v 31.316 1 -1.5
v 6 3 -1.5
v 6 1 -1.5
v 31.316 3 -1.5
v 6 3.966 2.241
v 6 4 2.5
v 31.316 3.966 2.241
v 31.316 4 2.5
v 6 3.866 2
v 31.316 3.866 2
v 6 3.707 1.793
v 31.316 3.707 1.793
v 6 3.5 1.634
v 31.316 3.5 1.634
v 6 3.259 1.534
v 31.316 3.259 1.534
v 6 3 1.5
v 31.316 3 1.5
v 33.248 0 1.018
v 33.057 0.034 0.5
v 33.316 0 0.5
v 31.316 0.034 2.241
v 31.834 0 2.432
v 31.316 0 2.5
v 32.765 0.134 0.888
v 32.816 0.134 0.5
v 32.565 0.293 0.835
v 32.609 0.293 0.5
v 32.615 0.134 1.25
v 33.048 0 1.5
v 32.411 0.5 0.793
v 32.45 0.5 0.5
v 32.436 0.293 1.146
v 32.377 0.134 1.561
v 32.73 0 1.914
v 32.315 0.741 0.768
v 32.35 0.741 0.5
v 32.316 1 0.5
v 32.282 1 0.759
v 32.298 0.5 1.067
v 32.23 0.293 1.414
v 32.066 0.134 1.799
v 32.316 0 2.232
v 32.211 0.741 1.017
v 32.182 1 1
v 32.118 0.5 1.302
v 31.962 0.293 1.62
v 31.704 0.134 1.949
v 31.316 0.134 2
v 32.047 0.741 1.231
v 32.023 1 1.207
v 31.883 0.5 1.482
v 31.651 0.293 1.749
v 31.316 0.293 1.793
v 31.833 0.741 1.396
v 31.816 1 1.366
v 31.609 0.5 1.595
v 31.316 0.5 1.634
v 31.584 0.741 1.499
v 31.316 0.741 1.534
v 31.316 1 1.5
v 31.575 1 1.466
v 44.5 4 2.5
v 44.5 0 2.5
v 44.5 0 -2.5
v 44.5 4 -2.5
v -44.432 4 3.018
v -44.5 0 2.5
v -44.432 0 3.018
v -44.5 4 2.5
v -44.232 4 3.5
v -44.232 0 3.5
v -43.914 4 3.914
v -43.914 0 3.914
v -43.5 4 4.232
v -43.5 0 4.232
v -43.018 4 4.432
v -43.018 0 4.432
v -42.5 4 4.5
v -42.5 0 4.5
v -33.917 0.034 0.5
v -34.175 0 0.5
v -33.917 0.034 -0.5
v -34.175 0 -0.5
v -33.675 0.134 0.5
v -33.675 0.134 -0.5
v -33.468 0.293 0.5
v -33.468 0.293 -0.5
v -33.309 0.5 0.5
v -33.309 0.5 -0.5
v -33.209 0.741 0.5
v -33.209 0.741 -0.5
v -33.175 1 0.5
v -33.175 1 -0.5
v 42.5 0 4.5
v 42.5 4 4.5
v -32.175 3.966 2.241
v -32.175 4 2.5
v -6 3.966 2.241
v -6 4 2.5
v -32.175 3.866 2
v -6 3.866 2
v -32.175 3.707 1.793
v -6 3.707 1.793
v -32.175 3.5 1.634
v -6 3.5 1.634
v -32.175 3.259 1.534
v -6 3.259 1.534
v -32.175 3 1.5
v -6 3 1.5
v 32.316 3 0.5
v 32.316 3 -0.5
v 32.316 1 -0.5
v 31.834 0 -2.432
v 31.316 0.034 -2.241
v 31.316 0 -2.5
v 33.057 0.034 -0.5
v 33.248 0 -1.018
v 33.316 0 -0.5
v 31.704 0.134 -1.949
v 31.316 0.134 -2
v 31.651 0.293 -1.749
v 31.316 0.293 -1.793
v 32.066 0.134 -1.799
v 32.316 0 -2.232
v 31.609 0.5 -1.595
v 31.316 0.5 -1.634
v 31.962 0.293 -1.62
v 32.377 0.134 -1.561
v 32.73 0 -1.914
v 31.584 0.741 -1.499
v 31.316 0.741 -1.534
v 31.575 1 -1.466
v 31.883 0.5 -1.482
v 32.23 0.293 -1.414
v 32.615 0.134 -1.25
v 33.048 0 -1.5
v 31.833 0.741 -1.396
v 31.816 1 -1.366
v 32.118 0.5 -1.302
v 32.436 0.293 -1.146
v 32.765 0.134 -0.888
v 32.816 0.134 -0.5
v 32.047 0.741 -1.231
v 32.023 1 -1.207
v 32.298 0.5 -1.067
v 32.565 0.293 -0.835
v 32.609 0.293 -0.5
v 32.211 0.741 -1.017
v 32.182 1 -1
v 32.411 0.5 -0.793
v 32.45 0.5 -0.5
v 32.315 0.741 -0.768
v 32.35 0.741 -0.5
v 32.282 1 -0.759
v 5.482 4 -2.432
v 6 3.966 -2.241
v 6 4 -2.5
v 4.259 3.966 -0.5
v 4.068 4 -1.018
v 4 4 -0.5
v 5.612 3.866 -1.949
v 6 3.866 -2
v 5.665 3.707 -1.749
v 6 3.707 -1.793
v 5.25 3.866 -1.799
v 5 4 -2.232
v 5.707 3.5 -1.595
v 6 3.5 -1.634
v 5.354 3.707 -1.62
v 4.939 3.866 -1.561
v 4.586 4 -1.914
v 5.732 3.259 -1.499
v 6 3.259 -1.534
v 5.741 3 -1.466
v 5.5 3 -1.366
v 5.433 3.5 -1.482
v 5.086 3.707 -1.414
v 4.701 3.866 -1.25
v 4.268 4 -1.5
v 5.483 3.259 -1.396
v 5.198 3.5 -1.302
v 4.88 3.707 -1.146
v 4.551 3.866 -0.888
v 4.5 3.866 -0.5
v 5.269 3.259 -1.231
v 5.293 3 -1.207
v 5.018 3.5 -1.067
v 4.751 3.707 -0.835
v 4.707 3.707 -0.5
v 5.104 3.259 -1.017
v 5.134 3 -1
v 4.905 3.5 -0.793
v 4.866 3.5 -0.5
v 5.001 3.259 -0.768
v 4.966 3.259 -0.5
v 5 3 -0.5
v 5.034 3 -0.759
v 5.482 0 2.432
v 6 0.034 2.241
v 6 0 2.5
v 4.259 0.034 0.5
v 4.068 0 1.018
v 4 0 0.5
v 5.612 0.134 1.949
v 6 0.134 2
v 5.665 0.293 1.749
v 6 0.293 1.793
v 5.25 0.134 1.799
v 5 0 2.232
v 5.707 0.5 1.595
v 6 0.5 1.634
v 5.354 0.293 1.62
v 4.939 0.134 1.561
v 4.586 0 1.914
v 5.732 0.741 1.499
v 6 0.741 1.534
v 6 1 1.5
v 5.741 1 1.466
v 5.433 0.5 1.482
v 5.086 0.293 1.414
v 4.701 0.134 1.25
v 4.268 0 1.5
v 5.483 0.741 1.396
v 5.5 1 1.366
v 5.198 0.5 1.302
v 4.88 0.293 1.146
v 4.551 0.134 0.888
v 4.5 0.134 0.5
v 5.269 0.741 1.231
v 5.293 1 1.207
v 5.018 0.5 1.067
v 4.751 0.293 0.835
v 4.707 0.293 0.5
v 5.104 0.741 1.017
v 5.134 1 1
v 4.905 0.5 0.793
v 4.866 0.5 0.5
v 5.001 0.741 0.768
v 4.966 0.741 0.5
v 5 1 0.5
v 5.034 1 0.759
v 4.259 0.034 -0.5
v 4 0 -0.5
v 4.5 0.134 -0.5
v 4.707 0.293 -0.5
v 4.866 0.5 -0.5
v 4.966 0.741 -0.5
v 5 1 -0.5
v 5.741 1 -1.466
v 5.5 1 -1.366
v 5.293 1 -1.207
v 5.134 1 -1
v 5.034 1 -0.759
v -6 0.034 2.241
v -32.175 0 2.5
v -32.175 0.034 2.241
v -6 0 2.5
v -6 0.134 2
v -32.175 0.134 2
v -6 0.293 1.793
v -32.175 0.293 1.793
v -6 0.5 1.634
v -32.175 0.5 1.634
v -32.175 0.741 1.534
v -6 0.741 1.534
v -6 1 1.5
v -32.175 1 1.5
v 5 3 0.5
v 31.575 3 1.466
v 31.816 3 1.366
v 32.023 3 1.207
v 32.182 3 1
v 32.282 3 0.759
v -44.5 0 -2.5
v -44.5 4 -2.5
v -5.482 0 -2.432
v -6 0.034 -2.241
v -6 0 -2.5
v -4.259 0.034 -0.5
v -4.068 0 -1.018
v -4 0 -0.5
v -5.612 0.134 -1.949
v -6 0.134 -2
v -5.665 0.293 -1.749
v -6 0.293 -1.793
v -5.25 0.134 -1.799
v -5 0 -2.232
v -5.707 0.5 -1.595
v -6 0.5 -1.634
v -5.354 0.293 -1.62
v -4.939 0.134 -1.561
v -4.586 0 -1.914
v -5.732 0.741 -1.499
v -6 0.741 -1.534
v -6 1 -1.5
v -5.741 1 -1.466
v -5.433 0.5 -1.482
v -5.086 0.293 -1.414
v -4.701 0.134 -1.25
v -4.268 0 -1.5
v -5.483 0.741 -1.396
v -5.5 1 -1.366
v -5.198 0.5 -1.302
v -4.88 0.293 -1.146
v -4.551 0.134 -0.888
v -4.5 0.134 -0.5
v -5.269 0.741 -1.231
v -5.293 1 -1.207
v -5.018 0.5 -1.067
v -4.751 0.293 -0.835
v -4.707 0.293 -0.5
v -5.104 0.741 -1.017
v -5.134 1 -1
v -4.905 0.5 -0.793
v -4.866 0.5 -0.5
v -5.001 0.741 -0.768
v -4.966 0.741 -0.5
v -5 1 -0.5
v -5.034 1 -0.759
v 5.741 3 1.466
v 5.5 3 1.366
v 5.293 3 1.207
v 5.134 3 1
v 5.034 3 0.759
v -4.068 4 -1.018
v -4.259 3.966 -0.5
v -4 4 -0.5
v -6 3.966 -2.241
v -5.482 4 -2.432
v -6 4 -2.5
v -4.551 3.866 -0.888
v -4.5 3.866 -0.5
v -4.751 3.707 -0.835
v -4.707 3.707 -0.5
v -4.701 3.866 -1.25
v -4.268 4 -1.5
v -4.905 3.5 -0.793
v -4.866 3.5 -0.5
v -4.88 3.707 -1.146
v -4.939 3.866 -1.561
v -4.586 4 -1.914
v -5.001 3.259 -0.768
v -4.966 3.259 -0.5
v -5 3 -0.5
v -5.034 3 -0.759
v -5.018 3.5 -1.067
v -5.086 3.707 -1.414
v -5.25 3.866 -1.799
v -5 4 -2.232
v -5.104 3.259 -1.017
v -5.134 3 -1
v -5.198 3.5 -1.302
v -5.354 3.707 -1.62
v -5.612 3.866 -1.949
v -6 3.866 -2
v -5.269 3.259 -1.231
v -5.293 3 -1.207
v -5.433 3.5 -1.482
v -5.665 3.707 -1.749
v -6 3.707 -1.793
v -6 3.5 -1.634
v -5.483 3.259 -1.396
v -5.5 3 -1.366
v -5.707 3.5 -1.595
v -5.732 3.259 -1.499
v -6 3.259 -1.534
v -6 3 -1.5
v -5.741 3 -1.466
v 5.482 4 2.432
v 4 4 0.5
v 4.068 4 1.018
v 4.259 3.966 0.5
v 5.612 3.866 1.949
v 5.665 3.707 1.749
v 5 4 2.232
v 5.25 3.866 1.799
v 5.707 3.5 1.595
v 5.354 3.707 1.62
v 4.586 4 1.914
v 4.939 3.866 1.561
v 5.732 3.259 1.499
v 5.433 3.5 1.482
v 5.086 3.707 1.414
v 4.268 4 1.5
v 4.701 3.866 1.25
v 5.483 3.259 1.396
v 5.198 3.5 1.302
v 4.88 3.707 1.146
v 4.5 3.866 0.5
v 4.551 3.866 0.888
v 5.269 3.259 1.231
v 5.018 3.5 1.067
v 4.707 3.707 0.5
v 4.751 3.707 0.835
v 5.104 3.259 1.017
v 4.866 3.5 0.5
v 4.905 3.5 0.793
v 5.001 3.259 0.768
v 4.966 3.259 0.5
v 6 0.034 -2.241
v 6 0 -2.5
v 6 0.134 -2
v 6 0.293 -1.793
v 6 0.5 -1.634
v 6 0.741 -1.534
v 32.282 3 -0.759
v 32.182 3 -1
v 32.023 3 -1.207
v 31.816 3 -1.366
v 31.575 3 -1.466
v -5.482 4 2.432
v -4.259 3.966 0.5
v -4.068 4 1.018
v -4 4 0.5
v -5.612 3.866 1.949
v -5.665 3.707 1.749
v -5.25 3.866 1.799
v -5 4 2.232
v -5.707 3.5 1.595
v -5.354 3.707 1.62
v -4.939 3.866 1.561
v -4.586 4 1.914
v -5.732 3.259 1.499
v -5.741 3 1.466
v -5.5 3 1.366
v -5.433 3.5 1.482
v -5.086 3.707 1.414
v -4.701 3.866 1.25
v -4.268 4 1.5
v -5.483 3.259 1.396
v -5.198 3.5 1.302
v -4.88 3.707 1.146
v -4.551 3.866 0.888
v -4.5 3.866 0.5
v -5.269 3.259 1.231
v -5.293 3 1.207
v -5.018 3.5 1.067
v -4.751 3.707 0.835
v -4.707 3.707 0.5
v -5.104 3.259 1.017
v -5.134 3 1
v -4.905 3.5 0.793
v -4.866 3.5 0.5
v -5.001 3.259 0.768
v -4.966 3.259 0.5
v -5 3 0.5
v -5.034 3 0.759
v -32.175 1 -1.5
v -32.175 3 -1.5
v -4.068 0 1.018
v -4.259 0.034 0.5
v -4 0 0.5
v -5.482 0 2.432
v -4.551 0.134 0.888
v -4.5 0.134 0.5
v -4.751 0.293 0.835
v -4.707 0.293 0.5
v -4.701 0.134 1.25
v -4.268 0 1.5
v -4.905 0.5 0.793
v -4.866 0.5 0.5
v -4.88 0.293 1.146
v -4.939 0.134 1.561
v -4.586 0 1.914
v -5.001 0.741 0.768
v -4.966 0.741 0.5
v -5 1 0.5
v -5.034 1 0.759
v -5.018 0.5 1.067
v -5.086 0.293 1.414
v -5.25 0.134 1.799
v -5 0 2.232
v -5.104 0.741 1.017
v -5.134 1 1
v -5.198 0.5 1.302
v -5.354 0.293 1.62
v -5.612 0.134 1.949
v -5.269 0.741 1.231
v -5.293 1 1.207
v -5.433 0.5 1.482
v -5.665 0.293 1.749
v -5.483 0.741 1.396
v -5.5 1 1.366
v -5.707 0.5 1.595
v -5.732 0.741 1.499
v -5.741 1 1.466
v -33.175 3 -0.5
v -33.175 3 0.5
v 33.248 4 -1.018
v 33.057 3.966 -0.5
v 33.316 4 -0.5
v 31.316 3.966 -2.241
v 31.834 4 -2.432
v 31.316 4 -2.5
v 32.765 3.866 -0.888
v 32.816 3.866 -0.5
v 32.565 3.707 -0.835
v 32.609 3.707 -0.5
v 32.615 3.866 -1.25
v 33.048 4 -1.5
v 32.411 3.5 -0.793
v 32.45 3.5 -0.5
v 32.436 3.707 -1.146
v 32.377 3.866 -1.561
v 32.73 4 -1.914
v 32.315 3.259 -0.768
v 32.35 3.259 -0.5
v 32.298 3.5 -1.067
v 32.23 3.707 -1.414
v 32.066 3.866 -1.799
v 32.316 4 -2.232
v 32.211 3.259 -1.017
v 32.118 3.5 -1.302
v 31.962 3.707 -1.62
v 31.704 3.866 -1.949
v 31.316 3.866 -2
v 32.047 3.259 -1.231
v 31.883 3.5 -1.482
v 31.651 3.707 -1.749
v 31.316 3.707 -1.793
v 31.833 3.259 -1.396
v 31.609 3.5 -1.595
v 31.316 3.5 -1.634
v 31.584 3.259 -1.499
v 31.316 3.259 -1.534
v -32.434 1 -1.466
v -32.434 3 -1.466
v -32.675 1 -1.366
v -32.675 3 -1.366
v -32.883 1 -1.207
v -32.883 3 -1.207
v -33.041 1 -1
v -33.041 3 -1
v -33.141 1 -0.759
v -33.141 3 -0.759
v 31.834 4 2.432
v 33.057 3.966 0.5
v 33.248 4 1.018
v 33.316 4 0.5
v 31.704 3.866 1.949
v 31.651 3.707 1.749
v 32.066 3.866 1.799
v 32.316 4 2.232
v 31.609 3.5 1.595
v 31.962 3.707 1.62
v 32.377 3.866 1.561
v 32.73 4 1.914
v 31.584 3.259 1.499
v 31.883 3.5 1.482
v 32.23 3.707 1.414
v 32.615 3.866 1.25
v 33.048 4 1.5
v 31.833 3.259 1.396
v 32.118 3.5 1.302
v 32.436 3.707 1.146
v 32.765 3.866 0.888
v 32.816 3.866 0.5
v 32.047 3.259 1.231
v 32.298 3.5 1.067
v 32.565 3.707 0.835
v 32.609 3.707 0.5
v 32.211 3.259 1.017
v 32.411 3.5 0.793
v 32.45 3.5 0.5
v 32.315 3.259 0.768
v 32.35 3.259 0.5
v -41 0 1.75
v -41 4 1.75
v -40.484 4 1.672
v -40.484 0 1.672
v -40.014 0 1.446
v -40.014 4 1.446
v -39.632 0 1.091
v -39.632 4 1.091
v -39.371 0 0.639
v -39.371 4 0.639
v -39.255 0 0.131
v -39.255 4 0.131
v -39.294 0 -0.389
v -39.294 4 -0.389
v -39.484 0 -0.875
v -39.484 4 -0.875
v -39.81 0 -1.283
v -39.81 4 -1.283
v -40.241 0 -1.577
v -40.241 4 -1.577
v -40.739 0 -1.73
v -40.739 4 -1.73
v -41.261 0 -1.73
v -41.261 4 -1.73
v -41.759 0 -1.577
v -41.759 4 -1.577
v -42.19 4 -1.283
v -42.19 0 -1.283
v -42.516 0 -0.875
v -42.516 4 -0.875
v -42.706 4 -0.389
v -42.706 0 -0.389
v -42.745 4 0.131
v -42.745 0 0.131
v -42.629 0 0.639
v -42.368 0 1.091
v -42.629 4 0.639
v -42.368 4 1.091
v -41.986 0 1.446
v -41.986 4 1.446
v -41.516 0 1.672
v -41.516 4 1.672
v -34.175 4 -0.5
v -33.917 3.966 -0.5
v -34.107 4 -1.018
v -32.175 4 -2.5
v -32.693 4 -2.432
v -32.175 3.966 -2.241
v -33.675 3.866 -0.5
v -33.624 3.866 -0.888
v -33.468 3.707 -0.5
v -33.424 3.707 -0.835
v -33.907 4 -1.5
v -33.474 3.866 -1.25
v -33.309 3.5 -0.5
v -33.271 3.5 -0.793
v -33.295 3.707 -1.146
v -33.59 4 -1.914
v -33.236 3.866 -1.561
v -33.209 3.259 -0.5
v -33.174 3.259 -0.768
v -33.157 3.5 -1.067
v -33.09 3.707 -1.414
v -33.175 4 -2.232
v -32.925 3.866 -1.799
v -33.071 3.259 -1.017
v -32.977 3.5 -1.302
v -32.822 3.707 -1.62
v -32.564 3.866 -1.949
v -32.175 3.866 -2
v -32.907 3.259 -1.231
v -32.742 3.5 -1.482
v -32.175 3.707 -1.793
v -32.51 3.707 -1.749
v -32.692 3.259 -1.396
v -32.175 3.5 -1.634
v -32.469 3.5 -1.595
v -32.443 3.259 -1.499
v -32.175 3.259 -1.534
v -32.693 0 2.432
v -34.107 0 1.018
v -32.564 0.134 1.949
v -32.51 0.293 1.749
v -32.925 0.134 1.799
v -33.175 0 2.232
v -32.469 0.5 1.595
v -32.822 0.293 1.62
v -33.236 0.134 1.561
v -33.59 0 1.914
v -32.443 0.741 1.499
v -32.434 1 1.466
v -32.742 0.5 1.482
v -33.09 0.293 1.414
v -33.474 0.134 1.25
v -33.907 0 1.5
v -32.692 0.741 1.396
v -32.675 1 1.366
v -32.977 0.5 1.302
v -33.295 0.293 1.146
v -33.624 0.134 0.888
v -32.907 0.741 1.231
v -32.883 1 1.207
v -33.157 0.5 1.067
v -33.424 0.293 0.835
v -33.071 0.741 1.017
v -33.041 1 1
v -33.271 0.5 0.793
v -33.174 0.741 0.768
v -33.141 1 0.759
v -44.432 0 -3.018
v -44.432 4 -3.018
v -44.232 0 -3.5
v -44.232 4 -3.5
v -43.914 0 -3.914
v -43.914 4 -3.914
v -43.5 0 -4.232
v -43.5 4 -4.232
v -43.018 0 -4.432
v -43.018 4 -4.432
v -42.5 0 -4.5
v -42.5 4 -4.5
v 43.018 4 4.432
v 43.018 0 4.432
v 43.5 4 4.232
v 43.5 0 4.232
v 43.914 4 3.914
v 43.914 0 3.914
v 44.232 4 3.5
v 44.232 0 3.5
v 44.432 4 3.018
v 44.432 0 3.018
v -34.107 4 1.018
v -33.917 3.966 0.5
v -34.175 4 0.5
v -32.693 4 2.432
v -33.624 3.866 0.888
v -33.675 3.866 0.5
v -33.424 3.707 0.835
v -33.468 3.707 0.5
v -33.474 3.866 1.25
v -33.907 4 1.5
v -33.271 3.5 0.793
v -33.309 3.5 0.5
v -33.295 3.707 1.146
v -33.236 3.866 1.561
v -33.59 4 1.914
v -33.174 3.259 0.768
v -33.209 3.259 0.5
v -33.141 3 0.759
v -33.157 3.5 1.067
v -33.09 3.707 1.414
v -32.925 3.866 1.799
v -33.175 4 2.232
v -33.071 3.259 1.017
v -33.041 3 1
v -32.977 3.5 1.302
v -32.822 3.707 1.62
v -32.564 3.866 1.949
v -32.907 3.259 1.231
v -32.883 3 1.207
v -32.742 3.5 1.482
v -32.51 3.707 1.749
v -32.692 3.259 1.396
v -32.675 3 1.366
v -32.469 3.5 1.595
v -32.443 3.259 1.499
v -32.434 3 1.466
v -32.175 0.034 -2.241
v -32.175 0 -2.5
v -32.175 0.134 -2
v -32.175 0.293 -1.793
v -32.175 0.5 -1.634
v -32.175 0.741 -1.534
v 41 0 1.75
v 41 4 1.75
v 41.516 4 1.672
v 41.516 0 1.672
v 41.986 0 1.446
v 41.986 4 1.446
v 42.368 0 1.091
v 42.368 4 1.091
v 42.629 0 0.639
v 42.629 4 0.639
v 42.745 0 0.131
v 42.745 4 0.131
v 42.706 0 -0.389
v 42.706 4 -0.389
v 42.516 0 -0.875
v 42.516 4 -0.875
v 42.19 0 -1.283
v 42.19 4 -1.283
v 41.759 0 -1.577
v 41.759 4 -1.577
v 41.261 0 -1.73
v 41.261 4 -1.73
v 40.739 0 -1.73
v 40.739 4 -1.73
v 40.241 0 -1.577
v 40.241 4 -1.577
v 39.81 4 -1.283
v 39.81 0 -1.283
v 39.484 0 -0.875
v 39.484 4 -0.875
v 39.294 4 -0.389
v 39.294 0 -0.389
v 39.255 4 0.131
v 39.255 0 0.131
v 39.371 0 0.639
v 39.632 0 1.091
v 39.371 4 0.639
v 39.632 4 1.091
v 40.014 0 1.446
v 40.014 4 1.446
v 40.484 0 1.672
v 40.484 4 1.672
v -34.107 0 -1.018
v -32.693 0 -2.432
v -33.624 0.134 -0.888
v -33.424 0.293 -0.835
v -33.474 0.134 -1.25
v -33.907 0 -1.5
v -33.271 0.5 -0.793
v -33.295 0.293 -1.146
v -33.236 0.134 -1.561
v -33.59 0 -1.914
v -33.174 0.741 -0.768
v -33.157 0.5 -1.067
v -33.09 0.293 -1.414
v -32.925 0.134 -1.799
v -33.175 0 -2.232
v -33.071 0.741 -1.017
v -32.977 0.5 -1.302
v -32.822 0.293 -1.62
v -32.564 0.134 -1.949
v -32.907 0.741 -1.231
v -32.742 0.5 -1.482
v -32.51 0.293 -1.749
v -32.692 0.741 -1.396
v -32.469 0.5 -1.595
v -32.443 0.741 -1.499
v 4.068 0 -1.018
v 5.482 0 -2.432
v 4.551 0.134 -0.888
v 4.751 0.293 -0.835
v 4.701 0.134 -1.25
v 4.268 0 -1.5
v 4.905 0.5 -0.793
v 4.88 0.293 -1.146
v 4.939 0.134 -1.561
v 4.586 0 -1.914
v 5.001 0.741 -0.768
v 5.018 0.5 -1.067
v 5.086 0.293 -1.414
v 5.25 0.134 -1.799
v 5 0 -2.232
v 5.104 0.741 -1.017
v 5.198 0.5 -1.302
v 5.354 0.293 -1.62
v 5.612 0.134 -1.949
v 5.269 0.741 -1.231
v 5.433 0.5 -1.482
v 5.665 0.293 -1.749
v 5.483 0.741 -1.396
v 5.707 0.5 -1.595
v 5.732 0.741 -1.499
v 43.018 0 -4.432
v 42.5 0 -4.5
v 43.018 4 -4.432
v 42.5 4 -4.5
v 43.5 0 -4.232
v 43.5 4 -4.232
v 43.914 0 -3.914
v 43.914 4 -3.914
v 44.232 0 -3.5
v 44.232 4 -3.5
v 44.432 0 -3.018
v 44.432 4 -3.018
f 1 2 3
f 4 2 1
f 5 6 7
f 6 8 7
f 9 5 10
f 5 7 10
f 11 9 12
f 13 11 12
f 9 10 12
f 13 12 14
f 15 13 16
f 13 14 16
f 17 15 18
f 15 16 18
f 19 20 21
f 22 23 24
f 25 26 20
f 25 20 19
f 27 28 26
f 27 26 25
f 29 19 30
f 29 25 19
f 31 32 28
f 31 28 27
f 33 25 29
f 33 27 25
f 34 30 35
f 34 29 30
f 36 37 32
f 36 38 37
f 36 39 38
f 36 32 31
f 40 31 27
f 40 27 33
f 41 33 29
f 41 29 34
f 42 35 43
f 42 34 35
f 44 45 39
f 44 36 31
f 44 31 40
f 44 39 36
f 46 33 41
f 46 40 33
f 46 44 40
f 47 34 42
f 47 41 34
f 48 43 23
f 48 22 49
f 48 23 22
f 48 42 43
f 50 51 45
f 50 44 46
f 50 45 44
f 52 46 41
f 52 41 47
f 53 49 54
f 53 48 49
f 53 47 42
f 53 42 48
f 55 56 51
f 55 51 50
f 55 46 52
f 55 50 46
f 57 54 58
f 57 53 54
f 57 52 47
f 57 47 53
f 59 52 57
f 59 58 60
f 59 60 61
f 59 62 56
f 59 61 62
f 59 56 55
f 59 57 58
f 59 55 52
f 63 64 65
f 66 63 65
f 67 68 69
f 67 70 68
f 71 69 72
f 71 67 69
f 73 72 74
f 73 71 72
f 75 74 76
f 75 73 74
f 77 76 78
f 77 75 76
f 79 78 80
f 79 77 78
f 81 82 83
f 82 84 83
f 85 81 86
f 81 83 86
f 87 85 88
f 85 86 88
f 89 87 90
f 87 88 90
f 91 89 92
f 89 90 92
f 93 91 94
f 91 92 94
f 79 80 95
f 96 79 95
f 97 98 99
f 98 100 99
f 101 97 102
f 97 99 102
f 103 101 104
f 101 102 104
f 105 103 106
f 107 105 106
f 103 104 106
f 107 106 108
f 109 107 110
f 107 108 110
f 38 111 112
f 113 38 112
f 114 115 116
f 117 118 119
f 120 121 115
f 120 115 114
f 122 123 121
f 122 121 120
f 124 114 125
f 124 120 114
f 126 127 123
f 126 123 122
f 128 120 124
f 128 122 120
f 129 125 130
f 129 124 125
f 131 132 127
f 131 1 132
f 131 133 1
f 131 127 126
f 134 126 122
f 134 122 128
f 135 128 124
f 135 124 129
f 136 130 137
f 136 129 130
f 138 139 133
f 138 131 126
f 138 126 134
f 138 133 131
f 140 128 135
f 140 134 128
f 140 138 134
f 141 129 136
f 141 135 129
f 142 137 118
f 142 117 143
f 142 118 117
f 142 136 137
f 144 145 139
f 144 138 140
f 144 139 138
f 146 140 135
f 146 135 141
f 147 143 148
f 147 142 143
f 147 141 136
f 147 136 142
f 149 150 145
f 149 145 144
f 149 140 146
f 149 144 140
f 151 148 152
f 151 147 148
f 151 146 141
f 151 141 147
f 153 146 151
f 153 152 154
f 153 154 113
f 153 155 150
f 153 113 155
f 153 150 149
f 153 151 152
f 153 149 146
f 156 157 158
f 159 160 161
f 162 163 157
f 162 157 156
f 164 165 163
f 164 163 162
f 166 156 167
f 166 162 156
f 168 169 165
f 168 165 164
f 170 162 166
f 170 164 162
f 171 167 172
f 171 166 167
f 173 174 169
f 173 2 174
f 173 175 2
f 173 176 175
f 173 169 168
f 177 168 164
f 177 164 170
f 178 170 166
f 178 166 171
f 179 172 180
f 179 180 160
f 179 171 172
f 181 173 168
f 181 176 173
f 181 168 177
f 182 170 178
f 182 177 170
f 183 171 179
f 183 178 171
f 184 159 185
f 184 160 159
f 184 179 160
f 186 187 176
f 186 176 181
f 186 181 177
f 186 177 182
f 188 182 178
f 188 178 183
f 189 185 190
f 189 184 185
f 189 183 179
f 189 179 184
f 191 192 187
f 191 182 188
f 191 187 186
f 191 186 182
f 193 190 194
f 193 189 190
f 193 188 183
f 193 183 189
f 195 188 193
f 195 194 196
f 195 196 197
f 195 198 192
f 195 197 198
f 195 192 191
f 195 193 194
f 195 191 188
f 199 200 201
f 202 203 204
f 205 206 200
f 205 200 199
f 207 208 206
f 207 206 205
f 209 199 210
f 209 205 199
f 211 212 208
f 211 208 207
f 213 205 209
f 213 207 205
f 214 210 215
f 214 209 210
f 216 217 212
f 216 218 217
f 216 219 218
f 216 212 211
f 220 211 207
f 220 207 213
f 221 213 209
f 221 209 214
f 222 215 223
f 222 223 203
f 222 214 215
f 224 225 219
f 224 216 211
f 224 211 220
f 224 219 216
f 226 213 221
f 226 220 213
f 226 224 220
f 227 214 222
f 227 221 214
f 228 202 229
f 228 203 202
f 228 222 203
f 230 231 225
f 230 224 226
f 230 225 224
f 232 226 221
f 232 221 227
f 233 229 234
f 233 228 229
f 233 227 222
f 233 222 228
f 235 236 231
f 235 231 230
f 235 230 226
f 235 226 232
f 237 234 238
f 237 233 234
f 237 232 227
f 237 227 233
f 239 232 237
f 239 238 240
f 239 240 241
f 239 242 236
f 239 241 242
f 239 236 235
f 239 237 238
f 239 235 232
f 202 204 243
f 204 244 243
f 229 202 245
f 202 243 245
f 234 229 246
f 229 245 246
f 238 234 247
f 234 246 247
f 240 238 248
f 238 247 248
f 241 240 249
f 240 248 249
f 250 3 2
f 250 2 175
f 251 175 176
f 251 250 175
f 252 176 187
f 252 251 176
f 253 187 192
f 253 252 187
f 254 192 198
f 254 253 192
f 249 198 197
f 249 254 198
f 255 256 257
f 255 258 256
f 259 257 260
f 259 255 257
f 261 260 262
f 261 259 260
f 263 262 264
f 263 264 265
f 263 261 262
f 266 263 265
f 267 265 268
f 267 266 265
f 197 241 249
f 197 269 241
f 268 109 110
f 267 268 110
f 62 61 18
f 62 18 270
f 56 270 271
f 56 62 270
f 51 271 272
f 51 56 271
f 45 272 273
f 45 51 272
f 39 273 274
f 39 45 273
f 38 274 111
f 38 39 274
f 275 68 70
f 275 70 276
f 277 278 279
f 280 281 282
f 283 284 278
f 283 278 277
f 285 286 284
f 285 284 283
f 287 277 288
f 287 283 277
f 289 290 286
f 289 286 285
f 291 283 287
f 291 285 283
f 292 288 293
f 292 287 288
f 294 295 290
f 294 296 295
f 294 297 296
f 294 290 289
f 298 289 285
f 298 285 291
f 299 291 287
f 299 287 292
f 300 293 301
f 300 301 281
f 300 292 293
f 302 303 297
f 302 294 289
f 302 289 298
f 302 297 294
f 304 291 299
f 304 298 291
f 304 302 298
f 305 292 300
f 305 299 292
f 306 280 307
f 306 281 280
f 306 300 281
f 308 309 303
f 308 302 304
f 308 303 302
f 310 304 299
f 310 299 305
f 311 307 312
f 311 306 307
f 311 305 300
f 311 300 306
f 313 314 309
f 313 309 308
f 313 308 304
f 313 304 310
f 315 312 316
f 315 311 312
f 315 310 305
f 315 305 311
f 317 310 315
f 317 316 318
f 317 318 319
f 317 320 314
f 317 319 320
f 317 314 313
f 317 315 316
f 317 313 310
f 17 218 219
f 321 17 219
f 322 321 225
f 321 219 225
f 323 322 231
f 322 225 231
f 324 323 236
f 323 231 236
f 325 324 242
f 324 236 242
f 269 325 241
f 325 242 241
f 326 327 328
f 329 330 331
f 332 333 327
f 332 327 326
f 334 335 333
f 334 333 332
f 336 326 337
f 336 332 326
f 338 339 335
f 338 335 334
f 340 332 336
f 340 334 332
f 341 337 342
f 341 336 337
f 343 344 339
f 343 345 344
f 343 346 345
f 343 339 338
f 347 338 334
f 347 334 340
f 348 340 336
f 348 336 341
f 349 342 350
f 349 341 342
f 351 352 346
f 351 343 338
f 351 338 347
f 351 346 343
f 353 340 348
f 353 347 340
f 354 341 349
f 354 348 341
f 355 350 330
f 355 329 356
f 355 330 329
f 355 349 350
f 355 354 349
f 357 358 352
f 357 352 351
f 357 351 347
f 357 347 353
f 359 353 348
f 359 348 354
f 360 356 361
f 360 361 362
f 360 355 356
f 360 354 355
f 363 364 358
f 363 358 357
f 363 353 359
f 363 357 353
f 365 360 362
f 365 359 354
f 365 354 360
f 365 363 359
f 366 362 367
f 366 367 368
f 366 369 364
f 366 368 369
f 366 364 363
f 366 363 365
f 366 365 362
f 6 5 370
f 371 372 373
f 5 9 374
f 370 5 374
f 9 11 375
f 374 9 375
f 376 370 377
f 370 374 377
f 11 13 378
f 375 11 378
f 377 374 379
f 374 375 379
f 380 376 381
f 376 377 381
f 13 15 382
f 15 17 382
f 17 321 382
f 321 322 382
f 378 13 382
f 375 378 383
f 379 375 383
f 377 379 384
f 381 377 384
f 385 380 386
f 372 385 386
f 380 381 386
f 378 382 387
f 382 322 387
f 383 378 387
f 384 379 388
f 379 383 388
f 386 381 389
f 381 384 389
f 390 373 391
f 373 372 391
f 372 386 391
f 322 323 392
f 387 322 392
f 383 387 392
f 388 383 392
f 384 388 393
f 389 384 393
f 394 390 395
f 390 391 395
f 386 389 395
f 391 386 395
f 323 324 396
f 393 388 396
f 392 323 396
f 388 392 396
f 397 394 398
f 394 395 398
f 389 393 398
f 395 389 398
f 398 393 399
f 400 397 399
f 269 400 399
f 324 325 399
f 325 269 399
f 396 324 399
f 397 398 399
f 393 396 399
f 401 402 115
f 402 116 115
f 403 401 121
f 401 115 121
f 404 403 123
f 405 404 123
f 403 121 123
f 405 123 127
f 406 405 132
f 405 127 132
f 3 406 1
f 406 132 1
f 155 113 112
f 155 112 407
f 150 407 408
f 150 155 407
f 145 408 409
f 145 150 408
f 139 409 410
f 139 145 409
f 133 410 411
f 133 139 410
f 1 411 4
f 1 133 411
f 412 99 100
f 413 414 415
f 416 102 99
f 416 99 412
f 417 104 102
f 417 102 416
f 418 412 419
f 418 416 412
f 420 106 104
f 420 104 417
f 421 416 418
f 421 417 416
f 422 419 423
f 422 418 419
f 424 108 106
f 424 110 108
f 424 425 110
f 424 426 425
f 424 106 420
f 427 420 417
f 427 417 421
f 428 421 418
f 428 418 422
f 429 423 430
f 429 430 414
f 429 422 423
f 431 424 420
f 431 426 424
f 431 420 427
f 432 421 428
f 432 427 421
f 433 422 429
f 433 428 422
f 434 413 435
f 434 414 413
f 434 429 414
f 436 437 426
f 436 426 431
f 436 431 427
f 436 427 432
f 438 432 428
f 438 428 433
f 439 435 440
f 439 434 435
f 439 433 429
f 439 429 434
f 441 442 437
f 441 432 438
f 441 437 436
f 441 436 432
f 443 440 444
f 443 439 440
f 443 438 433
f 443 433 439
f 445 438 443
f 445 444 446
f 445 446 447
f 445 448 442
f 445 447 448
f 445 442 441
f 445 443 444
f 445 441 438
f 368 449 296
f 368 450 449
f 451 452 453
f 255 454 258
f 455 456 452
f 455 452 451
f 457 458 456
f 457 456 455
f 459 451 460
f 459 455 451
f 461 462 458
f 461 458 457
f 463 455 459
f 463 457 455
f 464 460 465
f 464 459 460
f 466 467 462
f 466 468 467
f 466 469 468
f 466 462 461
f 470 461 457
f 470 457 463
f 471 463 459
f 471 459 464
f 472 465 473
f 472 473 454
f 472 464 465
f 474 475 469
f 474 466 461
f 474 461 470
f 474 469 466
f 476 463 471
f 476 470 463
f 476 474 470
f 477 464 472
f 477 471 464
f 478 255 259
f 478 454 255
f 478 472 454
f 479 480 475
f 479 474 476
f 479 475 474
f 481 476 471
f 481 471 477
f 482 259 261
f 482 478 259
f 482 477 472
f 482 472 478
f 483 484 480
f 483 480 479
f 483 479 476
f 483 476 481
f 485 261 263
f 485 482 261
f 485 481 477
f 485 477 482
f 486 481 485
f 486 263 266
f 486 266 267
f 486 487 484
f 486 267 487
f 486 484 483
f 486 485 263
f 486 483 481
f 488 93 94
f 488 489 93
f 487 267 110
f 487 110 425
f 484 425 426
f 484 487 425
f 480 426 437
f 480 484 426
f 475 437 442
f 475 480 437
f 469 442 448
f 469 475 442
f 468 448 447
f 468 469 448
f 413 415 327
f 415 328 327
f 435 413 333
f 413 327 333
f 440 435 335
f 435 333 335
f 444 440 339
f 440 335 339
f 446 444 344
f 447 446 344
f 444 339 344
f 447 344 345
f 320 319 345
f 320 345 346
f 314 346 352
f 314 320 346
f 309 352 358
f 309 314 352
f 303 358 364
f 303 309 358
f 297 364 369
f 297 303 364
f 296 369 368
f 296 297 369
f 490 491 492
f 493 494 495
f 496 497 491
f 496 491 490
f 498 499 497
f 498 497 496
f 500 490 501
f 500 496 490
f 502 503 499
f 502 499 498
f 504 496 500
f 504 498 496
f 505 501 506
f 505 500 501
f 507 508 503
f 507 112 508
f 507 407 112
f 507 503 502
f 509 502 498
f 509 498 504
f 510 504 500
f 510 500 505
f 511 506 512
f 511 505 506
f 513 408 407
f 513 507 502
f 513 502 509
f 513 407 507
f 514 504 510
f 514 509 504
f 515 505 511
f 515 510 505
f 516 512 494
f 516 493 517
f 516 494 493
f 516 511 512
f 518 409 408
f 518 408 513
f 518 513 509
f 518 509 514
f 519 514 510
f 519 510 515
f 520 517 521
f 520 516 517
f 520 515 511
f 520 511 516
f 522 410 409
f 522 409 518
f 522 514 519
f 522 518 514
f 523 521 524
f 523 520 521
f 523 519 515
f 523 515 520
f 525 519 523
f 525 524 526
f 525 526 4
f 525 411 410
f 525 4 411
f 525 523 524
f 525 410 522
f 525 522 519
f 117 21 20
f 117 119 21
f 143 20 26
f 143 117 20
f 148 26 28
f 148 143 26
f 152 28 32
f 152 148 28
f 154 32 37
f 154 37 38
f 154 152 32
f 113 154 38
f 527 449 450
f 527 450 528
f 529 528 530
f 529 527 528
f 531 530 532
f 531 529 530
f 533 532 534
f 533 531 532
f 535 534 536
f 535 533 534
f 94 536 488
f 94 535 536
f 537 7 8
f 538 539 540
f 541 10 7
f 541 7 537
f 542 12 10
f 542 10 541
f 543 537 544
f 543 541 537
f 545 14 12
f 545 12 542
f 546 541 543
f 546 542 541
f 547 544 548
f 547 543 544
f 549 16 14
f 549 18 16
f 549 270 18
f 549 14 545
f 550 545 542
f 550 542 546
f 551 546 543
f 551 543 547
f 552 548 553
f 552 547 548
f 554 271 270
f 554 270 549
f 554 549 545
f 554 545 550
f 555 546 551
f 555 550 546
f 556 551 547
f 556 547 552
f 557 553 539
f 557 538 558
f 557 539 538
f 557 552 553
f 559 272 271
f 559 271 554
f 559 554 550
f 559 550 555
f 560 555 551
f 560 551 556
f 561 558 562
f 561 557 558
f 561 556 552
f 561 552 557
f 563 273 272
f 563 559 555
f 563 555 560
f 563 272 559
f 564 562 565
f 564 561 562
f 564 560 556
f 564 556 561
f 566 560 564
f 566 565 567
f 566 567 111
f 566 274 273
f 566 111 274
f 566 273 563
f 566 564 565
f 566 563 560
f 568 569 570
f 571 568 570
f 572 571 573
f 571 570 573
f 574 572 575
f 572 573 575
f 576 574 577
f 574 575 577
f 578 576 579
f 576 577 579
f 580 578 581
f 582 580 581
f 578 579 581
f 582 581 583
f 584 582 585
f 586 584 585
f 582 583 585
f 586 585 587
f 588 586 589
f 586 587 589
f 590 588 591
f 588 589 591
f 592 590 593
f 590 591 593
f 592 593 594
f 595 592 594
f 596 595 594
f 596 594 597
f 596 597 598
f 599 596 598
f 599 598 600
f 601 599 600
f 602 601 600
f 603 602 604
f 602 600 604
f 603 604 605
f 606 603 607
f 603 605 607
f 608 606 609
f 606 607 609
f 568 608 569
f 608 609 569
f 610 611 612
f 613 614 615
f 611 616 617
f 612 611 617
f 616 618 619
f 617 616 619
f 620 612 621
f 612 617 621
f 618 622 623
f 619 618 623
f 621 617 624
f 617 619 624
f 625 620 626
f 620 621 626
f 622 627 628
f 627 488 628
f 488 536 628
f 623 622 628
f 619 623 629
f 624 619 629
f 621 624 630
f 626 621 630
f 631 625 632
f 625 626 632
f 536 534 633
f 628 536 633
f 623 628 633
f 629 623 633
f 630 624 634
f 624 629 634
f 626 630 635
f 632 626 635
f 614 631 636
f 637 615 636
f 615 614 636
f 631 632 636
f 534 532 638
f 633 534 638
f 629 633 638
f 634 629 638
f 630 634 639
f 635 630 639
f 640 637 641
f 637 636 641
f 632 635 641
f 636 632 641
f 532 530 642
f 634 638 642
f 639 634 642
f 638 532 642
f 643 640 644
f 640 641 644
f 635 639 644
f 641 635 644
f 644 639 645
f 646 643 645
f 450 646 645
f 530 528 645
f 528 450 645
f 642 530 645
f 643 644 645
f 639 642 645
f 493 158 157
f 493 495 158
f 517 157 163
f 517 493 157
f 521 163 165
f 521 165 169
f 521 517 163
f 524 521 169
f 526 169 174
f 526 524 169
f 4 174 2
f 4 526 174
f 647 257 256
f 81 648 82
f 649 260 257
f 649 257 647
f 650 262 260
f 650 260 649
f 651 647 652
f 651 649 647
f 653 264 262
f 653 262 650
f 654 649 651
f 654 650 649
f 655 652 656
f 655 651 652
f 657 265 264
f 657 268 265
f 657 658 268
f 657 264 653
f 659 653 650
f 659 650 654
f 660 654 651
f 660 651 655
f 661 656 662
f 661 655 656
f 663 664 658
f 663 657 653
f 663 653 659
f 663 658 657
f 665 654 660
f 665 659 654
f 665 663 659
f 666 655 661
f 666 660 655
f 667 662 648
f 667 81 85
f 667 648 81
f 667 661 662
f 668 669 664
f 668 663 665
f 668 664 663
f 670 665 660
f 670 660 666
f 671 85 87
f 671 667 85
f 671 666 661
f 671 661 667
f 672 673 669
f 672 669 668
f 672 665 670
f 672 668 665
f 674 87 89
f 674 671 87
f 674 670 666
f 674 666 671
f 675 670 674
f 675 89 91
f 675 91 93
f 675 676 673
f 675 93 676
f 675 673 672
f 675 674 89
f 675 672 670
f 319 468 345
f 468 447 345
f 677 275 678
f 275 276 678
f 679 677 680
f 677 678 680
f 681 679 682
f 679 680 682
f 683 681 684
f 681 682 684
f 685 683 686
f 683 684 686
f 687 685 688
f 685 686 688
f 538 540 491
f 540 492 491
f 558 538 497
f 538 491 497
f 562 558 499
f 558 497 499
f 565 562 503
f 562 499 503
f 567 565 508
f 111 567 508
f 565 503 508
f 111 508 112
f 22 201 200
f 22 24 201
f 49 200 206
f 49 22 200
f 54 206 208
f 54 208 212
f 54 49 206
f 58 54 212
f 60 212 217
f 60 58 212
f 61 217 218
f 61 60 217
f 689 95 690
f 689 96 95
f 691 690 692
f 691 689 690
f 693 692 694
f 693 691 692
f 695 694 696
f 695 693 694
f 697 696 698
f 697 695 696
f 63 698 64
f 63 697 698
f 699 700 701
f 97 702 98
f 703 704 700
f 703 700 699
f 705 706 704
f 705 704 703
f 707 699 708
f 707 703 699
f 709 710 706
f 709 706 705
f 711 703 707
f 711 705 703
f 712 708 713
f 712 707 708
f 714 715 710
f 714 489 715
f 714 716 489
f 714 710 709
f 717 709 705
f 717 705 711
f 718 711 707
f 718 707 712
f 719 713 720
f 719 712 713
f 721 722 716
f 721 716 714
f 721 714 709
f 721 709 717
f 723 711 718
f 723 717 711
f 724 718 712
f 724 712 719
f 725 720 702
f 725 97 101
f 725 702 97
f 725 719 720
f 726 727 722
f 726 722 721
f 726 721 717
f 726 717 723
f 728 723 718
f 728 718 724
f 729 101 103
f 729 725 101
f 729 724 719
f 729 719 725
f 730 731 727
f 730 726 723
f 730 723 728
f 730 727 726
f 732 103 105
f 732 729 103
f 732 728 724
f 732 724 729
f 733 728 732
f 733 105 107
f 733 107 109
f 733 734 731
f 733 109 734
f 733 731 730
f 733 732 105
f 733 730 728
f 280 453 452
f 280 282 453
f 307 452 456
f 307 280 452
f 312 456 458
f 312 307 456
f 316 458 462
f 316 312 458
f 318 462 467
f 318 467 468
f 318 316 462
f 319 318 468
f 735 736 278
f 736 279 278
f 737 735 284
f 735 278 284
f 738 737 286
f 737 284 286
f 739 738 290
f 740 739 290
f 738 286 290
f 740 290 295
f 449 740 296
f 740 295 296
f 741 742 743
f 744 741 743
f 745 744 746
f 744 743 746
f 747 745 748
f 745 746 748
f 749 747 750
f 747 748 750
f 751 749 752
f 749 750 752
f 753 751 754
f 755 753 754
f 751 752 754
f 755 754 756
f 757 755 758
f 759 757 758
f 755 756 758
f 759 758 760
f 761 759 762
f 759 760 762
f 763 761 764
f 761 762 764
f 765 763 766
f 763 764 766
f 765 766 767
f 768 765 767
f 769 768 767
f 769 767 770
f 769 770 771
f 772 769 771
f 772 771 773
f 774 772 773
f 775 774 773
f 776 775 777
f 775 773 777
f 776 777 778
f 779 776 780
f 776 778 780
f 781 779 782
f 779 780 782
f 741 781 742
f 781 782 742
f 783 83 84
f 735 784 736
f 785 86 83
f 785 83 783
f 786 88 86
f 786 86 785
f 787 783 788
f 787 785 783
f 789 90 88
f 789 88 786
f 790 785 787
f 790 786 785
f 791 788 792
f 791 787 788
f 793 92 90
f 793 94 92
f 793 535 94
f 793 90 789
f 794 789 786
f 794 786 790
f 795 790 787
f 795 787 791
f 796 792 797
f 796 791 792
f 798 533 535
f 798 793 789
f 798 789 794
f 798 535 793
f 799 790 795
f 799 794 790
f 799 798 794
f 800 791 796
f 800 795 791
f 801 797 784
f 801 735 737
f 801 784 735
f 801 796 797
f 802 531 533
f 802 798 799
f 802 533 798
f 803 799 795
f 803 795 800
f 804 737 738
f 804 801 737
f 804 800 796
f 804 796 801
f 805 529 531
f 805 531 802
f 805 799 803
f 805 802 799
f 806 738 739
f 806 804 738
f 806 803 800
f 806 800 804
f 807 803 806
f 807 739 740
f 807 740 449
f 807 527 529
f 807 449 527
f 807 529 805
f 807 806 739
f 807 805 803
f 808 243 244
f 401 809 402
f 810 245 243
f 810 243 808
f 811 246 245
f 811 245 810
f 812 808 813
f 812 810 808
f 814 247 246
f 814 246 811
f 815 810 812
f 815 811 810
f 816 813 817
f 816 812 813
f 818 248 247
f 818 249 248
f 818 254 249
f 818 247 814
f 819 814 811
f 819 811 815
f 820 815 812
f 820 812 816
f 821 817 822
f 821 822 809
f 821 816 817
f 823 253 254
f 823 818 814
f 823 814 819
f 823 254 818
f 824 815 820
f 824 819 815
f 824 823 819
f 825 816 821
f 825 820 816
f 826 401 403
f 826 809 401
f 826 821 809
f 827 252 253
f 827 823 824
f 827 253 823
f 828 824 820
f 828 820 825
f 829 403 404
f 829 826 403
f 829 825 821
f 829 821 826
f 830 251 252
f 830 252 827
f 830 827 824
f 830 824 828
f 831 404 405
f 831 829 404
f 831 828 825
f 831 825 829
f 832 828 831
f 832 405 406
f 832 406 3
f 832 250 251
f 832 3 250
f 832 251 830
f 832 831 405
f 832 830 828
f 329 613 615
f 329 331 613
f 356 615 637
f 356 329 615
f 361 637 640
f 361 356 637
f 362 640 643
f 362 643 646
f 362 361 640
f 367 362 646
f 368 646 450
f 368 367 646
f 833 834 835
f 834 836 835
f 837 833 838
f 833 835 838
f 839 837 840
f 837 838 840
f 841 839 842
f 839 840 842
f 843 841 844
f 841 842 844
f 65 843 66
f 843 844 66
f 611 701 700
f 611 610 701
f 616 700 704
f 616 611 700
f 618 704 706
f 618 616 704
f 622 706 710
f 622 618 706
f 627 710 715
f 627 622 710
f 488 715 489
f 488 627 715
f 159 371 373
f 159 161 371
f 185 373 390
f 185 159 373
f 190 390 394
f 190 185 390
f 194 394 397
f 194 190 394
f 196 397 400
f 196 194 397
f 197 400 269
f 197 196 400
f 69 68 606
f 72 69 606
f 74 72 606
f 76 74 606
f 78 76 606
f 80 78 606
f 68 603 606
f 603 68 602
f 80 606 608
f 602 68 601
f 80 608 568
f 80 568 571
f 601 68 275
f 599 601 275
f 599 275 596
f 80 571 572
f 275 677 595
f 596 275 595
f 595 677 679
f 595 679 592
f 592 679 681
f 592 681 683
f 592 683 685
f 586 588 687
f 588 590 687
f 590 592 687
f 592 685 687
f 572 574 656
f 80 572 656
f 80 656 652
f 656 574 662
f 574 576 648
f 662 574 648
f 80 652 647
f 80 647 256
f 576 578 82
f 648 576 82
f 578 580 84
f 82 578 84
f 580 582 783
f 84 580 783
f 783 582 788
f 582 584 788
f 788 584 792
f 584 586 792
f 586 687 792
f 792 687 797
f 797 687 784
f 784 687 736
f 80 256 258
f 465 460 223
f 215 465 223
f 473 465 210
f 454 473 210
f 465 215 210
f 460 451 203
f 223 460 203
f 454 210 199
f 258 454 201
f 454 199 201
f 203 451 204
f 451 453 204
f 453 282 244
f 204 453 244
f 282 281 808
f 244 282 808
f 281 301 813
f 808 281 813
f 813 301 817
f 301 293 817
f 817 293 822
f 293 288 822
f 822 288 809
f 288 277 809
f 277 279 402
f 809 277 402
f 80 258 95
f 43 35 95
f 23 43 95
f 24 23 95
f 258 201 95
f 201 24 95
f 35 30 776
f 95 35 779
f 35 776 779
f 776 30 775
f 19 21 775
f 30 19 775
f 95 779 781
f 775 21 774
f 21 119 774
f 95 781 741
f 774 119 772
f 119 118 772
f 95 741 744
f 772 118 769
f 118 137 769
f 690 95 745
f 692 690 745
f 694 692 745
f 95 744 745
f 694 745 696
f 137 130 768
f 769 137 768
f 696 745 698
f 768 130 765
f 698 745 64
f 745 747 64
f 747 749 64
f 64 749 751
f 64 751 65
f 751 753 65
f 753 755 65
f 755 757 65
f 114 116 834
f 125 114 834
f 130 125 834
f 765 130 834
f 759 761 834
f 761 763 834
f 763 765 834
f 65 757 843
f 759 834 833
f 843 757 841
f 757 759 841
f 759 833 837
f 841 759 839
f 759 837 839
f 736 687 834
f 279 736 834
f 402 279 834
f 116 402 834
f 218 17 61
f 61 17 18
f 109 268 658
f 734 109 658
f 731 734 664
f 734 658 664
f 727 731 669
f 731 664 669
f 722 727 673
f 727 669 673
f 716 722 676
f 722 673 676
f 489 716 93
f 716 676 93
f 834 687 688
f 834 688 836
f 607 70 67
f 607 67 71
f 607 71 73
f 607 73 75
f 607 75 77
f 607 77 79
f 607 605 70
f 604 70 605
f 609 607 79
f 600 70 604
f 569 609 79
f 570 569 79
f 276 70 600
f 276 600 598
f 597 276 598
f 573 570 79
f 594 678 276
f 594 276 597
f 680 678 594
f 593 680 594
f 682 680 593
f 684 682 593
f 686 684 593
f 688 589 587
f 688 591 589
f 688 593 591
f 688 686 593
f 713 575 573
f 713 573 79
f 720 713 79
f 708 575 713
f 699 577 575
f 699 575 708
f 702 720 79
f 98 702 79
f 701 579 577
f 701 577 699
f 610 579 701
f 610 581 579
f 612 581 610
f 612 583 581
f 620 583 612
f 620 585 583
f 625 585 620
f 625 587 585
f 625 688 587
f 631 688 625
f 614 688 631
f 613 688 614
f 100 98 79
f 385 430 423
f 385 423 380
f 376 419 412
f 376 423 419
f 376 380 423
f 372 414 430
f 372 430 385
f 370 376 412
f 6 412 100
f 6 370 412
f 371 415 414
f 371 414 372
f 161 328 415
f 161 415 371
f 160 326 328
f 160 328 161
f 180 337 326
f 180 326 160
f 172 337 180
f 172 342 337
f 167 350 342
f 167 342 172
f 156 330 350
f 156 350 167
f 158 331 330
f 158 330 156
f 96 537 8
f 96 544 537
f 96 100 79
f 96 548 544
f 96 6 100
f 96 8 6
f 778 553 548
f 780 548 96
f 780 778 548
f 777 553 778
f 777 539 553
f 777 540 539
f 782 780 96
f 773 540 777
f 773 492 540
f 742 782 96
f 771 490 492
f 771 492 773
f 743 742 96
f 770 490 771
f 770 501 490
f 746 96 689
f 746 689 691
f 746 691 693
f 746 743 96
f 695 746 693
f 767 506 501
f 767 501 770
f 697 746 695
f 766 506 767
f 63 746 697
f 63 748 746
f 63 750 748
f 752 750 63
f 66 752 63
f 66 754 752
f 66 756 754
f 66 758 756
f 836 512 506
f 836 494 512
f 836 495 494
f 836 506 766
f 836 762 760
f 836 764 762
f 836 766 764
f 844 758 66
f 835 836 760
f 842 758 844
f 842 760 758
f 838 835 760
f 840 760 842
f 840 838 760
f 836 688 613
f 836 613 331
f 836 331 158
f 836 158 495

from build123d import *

# Parameters (mm, degrees)
SKETCH1_W           = 89
SKETCH1_H           = 9
BOSS_EXTRUDE1_DEPTH = 4
SKETCH2_R           = 1.75
CUT_EXTRUDE1_DEPTH  = 4
FILLET1_R           = 2
SKETCH4_W           = 28.175409777
SKETCH4_H           = 3
SKETCH4_W_2         = 27.315943202
CUT_EXTRUDE2_DEPTH  = 45.905456239
FILLET3_R           = 1


with BuildPart() as part:
    # Sketch1 → Boss-Extrude1 (new body)
    with BuildSketch(Plane(origin=(0, 0, 0), x_dir=(1, 0, 0), z_dir=(0, 1, 0))):
        Rectangle(SKETCH1_W, SKETCH1_H)
    extrude(amount=BOSS_EXTRUDE1_DEPTH)

    # Sketch2 → Cut-Extrude1 (cut)
    with BuildSketch(Plane(origin=(0, 4, 0), x_dir=(1, 0, 0), z_dir=(0, 1, 0))):
        with Locations(Location((-41, 0, 0), (0, 0, 270))):
            Circle(SKETCH2_R)
        with Locations(Location((41, 0, 0), (0, 0, 270))):
            Circle(SKETCH2_R)
    extrude(amount=-CUT_EXTRUDE1_DEPTH, mode=Mode.SUBTRACT)

    # Fillet1
    fillet1_edges = [part.edges().sort_by_distance(p)[0] for p in [
        (-44.5, 2, -4.5),
        (44.5, 2, -4.5),
        (44.5, 2, 4.5),
        (-44.5, 2, 4.5),
    ]]
    fillet(fillet1_edges, radius=FILLET1_R)

    # Sketch4 → Cut-Extrude2 (cut, through all)
    with BuildSketch(Plane(origin=(0, 4, 0), x_dir=(1, 0, 0), z_dir=(0, 1, 0))):
        with Locations((-19.087704888, 0)):
            Rectangle(SKETCH4_W, SKETCH4_H)
        with Locations((18.657971601, 0)):
            Rectangle(SKETCH4_W_2, SKETCH4_H)
    extrude(amount=-CUT_EXTRUDE2_DEPTH, mode=Mode.SUBTRACT)

    # Fillet3
    fillet3_edges = [part.edges().sort_by_distance(p)[0] for p in [
        (-33.175409777, 0, 0),
        (-33.175409777, 2, 1.5),
        (-19.087704888, 0, -1.5),
        (-33.175409777, 2, -1.5),
        (-5, 0, 0),
        (-5, 2, -1.5),
        (-19.087704888, 0, 1.5),
        (-5, 2, 1.5),
        (-33.175409777, 4, 0),
        (-19.087704888, 4, 1.5),
        (-5, 4, 0),
        (-19.087704888, 4, -1.5),
        (18.657971601, 0, 1.5),
        (32.315943202, 2, 1.5),
        (5, 0, 0),
        (5, 2, 1.5),
        (18.657971601, 0, -1.5),
        (5, 2, -1.5),
        (32.315943202, 0, 0),
        (32.315943202, 2, -1.5),
        (18.657971601, 4, 1.5),
        (32.315943202, 4, 0),
        (18.657971601, 4, -1.5),
        (5, 4, 0),
    ]]
    fillet(fillet3_edges, radius=FILLET3_R)


solid = part.part
